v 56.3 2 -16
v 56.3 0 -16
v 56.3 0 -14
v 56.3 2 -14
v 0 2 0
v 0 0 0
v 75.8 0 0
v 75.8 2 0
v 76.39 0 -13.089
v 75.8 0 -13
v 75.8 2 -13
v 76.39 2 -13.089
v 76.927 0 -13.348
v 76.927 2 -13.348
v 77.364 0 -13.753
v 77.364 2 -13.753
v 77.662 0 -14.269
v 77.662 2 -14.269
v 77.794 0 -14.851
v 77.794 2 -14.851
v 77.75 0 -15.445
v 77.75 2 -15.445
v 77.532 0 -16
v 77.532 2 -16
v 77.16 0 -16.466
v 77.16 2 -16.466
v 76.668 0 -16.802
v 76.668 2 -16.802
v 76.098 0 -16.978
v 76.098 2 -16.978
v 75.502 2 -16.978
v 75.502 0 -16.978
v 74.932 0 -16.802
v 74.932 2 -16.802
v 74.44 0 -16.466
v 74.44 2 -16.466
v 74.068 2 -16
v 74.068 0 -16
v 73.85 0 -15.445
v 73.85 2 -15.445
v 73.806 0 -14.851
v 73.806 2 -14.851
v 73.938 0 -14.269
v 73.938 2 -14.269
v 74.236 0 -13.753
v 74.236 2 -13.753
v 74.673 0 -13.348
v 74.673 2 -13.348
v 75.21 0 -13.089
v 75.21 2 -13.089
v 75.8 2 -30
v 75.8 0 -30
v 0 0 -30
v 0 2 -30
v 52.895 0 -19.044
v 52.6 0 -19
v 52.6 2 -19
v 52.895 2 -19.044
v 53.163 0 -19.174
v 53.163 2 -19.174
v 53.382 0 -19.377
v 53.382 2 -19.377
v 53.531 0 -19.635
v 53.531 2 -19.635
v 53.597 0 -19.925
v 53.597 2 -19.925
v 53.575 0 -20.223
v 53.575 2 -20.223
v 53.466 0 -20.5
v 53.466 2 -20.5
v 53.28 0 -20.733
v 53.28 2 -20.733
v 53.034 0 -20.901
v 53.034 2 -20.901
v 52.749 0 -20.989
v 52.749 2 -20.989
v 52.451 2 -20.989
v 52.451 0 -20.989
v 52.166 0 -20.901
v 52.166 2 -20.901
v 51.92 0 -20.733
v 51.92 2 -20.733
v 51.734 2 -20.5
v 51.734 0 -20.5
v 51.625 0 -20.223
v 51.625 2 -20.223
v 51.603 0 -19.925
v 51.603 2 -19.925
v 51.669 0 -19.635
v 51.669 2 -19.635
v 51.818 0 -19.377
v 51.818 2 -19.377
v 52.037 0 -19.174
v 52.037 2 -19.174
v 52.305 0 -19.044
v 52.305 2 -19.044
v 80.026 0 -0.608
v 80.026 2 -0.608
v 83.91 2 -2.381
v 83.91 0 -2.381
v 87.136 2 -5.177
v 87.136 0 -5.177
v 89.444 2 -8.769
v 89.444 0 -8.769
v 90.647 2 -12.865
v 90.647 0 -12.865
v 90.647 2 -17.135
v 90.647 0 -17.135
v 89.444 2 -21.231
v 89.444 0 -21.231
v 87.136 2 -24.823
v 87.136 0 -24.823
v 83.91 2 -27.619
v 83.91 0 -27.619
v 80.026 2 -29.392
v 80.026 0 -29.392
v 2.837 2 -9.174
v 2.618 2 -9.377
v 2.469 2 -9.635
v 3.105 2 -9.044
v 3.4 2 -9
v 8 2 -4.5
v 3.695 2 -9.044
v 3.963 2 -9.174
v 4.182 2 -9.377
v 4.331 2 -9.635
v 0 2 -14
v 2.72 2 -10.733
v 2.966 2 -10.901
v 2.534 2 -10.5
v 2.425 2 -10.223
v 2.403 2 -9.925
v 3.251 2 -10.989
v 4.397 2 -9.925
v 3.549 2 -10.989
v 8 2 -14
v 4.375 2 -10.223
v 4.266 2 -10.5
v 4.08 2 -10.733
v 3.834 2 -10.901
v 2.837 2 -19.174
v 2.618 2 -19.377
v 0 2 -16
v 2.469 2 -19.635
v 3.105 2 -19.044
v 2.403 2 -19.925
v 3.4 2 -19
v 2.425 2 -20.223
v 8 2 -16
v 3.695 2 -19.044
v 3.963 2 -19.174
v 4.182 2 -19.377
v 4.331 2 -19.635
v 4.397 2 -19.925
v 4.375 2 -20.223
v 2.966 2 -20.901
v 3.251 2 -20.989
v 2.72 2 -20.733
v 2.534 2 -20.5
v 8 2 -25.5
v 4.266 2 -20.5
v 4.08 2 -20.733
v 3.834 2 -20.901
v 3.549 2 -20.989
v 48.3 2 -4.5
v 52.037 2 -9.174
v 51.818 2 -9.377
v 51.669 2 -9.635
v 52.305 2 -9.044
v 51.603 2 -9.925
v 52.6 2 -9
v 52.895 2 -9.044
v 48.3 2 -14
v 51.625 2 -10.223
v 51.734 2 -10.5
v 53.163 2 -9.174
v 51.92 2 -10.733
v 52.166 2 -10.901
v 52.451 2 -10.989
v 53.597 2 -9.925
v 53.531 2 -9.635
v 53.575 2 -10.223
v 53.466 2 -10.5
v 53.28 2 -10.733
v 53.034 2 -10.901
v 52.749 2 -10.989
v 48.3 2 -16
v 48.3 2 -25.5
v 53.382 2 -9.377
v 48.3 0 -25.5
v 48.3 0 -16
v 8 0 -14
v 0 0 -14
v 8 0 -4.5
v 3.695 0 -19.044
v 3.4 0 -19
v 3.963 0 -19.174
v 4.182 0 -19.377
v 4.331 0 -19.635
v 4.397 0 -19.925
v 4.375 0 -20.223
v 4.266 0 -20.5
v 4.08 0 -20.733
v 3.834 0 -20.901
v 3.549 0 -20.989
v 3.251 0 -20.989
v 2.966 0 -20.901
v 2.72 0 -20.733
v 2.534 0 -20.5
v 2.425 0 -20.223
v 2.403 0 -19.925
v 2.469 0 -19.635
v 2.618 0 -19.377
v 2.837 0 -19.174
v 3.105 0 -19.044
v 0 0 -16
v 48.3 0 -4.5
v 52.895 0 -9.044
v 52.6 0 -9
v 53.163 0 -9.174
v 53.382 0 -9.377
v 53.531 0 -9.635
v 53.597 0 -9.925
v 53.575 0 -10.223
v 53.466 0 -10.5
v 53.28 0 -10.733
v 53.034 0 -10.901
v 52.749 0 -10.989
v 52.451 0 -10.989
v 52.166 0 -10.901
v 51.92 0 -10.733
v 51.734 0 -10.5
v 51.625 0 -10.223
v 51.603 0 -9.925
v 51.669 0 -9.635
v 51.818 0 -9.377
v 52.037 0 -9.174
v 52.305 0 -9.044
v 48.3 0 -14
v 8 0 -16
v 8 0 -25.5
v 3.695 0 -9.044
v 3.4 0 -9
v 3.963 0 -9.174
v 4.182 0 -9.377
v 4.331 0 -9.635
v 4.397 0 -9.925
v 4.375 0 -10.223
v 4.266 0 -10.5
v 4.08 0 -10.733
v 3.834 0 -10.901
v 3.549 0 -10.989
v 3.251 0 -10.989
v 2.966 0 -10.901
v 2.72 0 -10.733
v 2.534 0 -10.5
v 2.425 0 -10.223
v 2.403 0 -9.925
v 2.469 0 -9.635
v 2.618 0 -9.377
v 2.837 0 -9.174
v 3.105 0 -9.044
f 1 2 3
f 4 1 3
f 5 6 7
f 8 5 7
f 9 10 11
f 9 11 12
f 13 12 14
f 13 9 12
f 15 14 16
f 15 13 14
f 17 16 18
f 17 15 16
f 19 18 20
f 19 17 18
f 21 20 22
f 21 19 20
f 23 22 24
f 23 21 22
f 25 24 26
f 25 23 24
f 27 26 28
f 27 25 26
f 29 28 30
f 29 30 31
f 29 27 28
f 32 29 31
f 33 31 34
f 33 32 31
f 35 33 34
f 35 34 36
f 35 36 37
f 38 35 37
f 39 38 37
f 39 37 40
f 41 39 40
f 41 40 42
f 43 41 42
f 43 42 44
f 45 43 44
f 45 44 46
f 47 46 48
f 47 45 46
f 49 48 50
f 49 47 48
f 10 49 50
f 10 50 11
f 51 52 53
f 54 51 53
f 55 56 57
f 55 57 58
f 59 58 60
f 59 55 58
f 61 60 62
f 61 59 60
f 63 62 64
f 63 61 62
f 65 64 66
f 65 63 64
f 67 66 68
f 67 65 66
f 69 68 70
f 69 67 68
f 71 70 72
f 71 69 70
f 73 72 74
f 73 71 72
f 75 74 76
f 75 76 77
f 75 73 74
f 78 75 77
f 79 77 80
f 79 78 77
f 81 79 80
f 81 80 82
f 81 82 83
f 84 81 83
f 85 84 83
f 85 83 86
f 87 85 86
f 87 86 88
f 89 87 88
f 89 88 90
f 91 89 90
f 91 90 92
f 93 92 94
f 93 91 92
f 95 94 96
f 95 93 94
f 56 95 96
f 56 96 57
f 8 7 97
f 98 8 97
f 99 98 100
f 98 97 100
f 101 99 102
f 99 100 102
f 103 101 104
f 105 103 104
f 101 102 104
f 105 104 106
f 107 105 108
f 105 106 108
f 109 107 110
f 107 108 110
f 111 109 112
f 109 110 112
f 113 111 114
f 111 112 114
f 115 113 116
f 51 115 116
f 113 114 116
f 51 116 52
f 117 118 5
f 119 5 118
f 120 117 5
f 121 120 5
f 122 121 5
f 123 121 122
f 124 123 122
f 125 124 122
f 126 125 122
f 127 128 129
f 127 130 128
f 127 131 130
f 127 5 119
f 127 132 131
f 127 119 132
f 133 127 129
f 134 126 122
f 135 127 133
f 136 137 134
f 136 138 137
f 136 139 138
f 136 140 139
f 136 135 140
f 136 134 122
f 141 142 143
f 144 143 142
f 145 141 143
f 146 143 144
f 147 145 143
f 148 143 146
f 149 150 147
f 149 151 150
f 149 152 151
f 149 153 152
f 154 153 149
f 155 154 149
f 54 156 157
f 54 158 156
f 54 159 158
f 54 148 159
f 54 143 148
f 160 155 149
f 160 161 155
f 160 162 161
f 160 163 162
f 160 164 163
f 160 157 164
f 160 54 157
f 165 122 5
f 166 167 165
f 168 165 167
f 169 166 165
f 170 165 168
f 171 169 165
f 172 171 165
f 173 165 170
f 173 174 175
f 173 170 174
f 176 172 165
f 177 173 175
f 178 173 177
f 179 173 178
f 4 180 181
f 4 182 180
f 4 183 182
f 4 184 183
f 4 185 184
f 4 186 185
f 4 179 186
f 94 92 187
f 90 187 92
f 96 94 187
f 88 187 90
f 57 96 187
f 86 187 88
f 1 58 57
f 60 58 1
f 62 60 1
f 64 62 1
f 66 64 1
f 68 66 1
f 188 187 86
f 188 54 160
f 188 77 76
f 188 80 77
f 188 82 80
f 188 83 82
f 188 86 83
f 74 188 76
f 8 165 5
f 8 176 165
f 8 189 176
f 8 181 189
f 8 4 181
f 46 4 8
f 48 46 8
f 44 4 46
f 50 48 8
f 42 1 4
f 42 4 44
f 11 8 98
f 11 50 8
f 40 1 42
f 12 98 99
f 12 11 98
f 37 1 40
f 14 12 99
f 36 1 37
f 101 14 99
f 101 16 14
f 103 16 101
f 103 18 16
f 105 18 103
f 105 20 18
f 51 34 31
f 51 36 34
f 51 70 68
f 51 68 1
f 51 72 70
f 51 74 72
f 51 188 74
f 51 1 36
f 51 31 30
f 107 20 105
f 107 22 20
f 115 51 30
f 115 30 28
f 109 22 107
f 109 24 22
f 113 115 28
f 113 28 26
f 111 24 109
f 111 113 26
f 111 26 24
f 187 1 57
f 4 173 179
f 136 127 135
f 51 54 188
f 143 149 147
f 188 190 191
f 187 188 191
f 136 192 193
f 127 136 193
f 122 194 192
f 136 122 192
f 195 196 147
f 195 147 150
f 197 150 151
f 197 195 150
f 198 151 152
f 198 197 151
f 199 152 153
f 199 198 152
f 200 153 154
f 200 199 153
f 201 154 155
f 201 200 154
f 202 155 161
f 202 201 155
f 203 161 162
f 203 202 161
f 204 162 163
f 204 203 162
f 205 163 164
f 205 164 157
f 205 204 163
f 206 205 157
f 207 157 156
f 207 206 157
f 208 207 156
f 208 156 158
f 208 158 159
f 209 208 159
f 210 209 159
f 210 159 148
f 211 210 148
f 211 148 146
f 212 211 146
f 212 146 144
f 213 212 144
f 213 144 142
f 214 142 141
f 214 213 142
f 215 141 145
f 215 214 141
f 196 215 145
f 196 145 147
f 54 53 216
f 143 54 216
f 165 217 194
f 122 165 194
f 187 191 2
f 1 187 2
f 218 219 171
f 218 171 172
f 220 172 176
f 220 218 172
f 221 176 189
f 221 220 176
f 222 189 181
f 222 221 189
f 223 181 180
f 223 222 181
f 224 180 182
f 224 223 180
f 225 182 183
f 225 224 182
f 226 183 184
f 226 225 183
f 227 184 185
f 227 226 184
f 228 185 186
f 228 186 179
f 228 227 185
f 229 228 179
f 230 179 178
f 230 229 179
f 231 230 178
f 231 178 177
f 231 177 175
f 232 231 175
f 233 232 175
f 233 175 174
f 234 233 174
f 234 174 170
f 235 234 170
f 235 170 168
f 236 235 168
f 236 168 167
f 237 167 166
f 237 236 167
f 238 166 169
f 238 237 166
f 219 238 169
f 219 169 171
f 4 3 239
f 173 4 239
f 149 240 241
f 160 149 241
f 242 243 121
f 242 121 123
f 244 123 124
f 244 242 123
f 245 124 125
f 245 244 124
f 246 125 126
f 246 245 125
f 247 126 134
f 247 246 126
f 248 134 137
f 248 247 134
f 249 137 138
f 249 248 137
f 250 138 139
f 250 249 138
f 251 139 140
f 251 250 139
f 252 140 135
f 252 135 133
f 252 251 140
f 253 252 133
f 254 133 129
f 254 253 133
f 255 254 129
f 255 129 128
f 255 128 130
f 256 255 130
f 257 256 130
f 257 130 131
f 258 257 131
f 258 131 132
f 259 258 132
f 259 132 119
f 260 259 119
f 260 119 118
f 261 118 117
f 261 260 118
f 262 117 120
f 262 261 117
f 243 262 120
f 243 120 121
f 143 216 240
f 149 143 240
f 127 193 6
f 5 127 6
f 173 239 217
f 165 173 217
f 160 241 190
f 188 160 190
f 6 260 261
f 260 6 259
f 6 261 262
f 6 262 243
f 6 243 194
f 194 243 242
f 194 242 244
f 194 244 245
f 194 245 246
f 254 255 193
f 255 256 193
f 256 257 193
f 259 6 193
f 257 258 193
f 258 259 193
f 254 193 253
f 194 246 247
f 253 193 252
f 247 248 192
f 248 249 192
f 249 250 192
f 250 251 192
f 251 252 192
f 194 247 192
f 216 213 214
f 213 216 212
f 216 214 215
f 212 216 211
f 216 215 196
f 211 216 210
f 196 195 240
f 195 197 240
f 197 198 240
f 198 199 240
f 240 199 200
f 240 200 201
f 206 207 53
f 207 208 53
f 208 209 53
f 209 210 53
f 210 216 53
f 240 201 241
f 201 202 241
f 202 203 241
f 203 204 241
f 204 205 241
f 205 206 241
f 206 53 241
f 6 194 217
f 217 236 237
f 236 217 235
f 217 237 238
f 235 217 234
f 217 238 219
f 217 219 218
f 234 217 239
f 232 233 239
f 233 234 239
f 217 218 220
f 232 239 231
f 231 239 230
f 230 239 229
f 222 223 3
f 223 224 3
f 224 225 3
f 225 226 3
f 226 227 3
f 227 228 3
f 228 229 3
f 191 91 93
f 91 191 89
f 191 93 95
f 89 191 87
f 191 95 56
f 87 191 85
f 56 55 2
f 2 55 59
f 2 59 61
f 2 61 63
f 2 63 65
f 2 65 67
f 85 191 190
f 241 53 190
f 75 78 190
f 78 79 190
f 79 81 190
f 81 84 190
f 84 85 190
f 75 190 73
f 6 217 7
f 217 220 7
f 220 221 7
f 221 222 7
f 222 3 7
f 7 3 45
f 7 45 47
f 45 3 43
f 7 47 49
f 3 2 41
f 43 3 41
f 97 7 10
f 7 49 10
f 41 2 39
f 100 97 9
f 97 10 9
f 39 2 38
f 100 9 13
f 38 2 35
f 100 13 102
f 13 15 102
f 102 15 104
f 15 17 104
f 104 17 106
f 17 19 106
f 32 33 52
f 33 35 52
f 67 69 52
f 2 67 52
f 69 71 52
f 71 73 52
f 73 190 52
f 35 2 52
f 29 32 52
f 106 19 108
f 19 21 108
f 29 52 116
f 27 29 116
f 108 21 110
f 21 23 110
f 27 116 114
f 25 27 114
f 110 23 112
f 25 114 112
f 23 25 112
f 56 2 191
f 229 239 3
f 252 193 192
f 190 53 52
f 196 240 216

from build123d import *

# Parameters (mm, degrees)
SKETCH_1_R      = 1
SKETCH_1_R_2    = 2
EXTRUDE_1_DEPTH = 2


with BuildPart() as part:
    # Эскиз1 → Бобышка-Вытянуть1 (new body)
    with BuildSketch(Plane(origin=(0, 0, 0), x_dir=(1, 0, 0), z_dir=(0, 1, 0))):
        with BuildLine():
            Line((8, 25.5), (48.3, 25.5))
            Line((48.3, 25.5), (48.3, 16))
            Line((48.3, 16), (56.3, 16))
            Line((56.3, 16), (56.3, 14))
            Line((56.3, 14), (48.3, 14))
            Line((48.3, 14), (48.3, 4.5))
            Line((48.3, 4.5), (8, 4.5))
            Line((8, 4.5), (8, 14))
            Line((8, 14), (0, 14))
            Line((0, 14), (0, 0))
            Line((0, 0), (75.8, 0))
            ThreePointArc((75.8, 0), (90.8, 15), (75.8, 30))
            Line((75.8, 30), (0, 30))
            Line((0, 30), (0, 16))
            Line((0, 16), (8, 16))
            Line((8, 16), (8, 25.5))
        make_face()
        with Locations(Location((3.4, 10, 0), (0, 0, 270))):
            Circle(SKETCH_1_R, mode=Mode.SUBTRACT)
        with Locations(Location((3.4, 20, 0), (0, 0, 270))):
            Circle(SKETCH_1_R, mode=Mode.SUBTRACT)
        with Locations(Location((52.6, 10, 0), (0, 0, 270))):
            Circle(SKETCH_1_R, mode=Mode.SUBTRACT)
        with Locations(Location((52.6, 20, 0), (0, 0, 270))):
            Circle(SKETCH_1_R, mode=Mode.SUBTRACT)
        with Locations(Location((75.8, 15, 0), (0, 0, 270))):
            Circle(SKETCH_1_R_2, mode=Mode.SUBTRACT)
    extrude(amount=EXTRUDE_1_DEPTH)


solid = part.part
